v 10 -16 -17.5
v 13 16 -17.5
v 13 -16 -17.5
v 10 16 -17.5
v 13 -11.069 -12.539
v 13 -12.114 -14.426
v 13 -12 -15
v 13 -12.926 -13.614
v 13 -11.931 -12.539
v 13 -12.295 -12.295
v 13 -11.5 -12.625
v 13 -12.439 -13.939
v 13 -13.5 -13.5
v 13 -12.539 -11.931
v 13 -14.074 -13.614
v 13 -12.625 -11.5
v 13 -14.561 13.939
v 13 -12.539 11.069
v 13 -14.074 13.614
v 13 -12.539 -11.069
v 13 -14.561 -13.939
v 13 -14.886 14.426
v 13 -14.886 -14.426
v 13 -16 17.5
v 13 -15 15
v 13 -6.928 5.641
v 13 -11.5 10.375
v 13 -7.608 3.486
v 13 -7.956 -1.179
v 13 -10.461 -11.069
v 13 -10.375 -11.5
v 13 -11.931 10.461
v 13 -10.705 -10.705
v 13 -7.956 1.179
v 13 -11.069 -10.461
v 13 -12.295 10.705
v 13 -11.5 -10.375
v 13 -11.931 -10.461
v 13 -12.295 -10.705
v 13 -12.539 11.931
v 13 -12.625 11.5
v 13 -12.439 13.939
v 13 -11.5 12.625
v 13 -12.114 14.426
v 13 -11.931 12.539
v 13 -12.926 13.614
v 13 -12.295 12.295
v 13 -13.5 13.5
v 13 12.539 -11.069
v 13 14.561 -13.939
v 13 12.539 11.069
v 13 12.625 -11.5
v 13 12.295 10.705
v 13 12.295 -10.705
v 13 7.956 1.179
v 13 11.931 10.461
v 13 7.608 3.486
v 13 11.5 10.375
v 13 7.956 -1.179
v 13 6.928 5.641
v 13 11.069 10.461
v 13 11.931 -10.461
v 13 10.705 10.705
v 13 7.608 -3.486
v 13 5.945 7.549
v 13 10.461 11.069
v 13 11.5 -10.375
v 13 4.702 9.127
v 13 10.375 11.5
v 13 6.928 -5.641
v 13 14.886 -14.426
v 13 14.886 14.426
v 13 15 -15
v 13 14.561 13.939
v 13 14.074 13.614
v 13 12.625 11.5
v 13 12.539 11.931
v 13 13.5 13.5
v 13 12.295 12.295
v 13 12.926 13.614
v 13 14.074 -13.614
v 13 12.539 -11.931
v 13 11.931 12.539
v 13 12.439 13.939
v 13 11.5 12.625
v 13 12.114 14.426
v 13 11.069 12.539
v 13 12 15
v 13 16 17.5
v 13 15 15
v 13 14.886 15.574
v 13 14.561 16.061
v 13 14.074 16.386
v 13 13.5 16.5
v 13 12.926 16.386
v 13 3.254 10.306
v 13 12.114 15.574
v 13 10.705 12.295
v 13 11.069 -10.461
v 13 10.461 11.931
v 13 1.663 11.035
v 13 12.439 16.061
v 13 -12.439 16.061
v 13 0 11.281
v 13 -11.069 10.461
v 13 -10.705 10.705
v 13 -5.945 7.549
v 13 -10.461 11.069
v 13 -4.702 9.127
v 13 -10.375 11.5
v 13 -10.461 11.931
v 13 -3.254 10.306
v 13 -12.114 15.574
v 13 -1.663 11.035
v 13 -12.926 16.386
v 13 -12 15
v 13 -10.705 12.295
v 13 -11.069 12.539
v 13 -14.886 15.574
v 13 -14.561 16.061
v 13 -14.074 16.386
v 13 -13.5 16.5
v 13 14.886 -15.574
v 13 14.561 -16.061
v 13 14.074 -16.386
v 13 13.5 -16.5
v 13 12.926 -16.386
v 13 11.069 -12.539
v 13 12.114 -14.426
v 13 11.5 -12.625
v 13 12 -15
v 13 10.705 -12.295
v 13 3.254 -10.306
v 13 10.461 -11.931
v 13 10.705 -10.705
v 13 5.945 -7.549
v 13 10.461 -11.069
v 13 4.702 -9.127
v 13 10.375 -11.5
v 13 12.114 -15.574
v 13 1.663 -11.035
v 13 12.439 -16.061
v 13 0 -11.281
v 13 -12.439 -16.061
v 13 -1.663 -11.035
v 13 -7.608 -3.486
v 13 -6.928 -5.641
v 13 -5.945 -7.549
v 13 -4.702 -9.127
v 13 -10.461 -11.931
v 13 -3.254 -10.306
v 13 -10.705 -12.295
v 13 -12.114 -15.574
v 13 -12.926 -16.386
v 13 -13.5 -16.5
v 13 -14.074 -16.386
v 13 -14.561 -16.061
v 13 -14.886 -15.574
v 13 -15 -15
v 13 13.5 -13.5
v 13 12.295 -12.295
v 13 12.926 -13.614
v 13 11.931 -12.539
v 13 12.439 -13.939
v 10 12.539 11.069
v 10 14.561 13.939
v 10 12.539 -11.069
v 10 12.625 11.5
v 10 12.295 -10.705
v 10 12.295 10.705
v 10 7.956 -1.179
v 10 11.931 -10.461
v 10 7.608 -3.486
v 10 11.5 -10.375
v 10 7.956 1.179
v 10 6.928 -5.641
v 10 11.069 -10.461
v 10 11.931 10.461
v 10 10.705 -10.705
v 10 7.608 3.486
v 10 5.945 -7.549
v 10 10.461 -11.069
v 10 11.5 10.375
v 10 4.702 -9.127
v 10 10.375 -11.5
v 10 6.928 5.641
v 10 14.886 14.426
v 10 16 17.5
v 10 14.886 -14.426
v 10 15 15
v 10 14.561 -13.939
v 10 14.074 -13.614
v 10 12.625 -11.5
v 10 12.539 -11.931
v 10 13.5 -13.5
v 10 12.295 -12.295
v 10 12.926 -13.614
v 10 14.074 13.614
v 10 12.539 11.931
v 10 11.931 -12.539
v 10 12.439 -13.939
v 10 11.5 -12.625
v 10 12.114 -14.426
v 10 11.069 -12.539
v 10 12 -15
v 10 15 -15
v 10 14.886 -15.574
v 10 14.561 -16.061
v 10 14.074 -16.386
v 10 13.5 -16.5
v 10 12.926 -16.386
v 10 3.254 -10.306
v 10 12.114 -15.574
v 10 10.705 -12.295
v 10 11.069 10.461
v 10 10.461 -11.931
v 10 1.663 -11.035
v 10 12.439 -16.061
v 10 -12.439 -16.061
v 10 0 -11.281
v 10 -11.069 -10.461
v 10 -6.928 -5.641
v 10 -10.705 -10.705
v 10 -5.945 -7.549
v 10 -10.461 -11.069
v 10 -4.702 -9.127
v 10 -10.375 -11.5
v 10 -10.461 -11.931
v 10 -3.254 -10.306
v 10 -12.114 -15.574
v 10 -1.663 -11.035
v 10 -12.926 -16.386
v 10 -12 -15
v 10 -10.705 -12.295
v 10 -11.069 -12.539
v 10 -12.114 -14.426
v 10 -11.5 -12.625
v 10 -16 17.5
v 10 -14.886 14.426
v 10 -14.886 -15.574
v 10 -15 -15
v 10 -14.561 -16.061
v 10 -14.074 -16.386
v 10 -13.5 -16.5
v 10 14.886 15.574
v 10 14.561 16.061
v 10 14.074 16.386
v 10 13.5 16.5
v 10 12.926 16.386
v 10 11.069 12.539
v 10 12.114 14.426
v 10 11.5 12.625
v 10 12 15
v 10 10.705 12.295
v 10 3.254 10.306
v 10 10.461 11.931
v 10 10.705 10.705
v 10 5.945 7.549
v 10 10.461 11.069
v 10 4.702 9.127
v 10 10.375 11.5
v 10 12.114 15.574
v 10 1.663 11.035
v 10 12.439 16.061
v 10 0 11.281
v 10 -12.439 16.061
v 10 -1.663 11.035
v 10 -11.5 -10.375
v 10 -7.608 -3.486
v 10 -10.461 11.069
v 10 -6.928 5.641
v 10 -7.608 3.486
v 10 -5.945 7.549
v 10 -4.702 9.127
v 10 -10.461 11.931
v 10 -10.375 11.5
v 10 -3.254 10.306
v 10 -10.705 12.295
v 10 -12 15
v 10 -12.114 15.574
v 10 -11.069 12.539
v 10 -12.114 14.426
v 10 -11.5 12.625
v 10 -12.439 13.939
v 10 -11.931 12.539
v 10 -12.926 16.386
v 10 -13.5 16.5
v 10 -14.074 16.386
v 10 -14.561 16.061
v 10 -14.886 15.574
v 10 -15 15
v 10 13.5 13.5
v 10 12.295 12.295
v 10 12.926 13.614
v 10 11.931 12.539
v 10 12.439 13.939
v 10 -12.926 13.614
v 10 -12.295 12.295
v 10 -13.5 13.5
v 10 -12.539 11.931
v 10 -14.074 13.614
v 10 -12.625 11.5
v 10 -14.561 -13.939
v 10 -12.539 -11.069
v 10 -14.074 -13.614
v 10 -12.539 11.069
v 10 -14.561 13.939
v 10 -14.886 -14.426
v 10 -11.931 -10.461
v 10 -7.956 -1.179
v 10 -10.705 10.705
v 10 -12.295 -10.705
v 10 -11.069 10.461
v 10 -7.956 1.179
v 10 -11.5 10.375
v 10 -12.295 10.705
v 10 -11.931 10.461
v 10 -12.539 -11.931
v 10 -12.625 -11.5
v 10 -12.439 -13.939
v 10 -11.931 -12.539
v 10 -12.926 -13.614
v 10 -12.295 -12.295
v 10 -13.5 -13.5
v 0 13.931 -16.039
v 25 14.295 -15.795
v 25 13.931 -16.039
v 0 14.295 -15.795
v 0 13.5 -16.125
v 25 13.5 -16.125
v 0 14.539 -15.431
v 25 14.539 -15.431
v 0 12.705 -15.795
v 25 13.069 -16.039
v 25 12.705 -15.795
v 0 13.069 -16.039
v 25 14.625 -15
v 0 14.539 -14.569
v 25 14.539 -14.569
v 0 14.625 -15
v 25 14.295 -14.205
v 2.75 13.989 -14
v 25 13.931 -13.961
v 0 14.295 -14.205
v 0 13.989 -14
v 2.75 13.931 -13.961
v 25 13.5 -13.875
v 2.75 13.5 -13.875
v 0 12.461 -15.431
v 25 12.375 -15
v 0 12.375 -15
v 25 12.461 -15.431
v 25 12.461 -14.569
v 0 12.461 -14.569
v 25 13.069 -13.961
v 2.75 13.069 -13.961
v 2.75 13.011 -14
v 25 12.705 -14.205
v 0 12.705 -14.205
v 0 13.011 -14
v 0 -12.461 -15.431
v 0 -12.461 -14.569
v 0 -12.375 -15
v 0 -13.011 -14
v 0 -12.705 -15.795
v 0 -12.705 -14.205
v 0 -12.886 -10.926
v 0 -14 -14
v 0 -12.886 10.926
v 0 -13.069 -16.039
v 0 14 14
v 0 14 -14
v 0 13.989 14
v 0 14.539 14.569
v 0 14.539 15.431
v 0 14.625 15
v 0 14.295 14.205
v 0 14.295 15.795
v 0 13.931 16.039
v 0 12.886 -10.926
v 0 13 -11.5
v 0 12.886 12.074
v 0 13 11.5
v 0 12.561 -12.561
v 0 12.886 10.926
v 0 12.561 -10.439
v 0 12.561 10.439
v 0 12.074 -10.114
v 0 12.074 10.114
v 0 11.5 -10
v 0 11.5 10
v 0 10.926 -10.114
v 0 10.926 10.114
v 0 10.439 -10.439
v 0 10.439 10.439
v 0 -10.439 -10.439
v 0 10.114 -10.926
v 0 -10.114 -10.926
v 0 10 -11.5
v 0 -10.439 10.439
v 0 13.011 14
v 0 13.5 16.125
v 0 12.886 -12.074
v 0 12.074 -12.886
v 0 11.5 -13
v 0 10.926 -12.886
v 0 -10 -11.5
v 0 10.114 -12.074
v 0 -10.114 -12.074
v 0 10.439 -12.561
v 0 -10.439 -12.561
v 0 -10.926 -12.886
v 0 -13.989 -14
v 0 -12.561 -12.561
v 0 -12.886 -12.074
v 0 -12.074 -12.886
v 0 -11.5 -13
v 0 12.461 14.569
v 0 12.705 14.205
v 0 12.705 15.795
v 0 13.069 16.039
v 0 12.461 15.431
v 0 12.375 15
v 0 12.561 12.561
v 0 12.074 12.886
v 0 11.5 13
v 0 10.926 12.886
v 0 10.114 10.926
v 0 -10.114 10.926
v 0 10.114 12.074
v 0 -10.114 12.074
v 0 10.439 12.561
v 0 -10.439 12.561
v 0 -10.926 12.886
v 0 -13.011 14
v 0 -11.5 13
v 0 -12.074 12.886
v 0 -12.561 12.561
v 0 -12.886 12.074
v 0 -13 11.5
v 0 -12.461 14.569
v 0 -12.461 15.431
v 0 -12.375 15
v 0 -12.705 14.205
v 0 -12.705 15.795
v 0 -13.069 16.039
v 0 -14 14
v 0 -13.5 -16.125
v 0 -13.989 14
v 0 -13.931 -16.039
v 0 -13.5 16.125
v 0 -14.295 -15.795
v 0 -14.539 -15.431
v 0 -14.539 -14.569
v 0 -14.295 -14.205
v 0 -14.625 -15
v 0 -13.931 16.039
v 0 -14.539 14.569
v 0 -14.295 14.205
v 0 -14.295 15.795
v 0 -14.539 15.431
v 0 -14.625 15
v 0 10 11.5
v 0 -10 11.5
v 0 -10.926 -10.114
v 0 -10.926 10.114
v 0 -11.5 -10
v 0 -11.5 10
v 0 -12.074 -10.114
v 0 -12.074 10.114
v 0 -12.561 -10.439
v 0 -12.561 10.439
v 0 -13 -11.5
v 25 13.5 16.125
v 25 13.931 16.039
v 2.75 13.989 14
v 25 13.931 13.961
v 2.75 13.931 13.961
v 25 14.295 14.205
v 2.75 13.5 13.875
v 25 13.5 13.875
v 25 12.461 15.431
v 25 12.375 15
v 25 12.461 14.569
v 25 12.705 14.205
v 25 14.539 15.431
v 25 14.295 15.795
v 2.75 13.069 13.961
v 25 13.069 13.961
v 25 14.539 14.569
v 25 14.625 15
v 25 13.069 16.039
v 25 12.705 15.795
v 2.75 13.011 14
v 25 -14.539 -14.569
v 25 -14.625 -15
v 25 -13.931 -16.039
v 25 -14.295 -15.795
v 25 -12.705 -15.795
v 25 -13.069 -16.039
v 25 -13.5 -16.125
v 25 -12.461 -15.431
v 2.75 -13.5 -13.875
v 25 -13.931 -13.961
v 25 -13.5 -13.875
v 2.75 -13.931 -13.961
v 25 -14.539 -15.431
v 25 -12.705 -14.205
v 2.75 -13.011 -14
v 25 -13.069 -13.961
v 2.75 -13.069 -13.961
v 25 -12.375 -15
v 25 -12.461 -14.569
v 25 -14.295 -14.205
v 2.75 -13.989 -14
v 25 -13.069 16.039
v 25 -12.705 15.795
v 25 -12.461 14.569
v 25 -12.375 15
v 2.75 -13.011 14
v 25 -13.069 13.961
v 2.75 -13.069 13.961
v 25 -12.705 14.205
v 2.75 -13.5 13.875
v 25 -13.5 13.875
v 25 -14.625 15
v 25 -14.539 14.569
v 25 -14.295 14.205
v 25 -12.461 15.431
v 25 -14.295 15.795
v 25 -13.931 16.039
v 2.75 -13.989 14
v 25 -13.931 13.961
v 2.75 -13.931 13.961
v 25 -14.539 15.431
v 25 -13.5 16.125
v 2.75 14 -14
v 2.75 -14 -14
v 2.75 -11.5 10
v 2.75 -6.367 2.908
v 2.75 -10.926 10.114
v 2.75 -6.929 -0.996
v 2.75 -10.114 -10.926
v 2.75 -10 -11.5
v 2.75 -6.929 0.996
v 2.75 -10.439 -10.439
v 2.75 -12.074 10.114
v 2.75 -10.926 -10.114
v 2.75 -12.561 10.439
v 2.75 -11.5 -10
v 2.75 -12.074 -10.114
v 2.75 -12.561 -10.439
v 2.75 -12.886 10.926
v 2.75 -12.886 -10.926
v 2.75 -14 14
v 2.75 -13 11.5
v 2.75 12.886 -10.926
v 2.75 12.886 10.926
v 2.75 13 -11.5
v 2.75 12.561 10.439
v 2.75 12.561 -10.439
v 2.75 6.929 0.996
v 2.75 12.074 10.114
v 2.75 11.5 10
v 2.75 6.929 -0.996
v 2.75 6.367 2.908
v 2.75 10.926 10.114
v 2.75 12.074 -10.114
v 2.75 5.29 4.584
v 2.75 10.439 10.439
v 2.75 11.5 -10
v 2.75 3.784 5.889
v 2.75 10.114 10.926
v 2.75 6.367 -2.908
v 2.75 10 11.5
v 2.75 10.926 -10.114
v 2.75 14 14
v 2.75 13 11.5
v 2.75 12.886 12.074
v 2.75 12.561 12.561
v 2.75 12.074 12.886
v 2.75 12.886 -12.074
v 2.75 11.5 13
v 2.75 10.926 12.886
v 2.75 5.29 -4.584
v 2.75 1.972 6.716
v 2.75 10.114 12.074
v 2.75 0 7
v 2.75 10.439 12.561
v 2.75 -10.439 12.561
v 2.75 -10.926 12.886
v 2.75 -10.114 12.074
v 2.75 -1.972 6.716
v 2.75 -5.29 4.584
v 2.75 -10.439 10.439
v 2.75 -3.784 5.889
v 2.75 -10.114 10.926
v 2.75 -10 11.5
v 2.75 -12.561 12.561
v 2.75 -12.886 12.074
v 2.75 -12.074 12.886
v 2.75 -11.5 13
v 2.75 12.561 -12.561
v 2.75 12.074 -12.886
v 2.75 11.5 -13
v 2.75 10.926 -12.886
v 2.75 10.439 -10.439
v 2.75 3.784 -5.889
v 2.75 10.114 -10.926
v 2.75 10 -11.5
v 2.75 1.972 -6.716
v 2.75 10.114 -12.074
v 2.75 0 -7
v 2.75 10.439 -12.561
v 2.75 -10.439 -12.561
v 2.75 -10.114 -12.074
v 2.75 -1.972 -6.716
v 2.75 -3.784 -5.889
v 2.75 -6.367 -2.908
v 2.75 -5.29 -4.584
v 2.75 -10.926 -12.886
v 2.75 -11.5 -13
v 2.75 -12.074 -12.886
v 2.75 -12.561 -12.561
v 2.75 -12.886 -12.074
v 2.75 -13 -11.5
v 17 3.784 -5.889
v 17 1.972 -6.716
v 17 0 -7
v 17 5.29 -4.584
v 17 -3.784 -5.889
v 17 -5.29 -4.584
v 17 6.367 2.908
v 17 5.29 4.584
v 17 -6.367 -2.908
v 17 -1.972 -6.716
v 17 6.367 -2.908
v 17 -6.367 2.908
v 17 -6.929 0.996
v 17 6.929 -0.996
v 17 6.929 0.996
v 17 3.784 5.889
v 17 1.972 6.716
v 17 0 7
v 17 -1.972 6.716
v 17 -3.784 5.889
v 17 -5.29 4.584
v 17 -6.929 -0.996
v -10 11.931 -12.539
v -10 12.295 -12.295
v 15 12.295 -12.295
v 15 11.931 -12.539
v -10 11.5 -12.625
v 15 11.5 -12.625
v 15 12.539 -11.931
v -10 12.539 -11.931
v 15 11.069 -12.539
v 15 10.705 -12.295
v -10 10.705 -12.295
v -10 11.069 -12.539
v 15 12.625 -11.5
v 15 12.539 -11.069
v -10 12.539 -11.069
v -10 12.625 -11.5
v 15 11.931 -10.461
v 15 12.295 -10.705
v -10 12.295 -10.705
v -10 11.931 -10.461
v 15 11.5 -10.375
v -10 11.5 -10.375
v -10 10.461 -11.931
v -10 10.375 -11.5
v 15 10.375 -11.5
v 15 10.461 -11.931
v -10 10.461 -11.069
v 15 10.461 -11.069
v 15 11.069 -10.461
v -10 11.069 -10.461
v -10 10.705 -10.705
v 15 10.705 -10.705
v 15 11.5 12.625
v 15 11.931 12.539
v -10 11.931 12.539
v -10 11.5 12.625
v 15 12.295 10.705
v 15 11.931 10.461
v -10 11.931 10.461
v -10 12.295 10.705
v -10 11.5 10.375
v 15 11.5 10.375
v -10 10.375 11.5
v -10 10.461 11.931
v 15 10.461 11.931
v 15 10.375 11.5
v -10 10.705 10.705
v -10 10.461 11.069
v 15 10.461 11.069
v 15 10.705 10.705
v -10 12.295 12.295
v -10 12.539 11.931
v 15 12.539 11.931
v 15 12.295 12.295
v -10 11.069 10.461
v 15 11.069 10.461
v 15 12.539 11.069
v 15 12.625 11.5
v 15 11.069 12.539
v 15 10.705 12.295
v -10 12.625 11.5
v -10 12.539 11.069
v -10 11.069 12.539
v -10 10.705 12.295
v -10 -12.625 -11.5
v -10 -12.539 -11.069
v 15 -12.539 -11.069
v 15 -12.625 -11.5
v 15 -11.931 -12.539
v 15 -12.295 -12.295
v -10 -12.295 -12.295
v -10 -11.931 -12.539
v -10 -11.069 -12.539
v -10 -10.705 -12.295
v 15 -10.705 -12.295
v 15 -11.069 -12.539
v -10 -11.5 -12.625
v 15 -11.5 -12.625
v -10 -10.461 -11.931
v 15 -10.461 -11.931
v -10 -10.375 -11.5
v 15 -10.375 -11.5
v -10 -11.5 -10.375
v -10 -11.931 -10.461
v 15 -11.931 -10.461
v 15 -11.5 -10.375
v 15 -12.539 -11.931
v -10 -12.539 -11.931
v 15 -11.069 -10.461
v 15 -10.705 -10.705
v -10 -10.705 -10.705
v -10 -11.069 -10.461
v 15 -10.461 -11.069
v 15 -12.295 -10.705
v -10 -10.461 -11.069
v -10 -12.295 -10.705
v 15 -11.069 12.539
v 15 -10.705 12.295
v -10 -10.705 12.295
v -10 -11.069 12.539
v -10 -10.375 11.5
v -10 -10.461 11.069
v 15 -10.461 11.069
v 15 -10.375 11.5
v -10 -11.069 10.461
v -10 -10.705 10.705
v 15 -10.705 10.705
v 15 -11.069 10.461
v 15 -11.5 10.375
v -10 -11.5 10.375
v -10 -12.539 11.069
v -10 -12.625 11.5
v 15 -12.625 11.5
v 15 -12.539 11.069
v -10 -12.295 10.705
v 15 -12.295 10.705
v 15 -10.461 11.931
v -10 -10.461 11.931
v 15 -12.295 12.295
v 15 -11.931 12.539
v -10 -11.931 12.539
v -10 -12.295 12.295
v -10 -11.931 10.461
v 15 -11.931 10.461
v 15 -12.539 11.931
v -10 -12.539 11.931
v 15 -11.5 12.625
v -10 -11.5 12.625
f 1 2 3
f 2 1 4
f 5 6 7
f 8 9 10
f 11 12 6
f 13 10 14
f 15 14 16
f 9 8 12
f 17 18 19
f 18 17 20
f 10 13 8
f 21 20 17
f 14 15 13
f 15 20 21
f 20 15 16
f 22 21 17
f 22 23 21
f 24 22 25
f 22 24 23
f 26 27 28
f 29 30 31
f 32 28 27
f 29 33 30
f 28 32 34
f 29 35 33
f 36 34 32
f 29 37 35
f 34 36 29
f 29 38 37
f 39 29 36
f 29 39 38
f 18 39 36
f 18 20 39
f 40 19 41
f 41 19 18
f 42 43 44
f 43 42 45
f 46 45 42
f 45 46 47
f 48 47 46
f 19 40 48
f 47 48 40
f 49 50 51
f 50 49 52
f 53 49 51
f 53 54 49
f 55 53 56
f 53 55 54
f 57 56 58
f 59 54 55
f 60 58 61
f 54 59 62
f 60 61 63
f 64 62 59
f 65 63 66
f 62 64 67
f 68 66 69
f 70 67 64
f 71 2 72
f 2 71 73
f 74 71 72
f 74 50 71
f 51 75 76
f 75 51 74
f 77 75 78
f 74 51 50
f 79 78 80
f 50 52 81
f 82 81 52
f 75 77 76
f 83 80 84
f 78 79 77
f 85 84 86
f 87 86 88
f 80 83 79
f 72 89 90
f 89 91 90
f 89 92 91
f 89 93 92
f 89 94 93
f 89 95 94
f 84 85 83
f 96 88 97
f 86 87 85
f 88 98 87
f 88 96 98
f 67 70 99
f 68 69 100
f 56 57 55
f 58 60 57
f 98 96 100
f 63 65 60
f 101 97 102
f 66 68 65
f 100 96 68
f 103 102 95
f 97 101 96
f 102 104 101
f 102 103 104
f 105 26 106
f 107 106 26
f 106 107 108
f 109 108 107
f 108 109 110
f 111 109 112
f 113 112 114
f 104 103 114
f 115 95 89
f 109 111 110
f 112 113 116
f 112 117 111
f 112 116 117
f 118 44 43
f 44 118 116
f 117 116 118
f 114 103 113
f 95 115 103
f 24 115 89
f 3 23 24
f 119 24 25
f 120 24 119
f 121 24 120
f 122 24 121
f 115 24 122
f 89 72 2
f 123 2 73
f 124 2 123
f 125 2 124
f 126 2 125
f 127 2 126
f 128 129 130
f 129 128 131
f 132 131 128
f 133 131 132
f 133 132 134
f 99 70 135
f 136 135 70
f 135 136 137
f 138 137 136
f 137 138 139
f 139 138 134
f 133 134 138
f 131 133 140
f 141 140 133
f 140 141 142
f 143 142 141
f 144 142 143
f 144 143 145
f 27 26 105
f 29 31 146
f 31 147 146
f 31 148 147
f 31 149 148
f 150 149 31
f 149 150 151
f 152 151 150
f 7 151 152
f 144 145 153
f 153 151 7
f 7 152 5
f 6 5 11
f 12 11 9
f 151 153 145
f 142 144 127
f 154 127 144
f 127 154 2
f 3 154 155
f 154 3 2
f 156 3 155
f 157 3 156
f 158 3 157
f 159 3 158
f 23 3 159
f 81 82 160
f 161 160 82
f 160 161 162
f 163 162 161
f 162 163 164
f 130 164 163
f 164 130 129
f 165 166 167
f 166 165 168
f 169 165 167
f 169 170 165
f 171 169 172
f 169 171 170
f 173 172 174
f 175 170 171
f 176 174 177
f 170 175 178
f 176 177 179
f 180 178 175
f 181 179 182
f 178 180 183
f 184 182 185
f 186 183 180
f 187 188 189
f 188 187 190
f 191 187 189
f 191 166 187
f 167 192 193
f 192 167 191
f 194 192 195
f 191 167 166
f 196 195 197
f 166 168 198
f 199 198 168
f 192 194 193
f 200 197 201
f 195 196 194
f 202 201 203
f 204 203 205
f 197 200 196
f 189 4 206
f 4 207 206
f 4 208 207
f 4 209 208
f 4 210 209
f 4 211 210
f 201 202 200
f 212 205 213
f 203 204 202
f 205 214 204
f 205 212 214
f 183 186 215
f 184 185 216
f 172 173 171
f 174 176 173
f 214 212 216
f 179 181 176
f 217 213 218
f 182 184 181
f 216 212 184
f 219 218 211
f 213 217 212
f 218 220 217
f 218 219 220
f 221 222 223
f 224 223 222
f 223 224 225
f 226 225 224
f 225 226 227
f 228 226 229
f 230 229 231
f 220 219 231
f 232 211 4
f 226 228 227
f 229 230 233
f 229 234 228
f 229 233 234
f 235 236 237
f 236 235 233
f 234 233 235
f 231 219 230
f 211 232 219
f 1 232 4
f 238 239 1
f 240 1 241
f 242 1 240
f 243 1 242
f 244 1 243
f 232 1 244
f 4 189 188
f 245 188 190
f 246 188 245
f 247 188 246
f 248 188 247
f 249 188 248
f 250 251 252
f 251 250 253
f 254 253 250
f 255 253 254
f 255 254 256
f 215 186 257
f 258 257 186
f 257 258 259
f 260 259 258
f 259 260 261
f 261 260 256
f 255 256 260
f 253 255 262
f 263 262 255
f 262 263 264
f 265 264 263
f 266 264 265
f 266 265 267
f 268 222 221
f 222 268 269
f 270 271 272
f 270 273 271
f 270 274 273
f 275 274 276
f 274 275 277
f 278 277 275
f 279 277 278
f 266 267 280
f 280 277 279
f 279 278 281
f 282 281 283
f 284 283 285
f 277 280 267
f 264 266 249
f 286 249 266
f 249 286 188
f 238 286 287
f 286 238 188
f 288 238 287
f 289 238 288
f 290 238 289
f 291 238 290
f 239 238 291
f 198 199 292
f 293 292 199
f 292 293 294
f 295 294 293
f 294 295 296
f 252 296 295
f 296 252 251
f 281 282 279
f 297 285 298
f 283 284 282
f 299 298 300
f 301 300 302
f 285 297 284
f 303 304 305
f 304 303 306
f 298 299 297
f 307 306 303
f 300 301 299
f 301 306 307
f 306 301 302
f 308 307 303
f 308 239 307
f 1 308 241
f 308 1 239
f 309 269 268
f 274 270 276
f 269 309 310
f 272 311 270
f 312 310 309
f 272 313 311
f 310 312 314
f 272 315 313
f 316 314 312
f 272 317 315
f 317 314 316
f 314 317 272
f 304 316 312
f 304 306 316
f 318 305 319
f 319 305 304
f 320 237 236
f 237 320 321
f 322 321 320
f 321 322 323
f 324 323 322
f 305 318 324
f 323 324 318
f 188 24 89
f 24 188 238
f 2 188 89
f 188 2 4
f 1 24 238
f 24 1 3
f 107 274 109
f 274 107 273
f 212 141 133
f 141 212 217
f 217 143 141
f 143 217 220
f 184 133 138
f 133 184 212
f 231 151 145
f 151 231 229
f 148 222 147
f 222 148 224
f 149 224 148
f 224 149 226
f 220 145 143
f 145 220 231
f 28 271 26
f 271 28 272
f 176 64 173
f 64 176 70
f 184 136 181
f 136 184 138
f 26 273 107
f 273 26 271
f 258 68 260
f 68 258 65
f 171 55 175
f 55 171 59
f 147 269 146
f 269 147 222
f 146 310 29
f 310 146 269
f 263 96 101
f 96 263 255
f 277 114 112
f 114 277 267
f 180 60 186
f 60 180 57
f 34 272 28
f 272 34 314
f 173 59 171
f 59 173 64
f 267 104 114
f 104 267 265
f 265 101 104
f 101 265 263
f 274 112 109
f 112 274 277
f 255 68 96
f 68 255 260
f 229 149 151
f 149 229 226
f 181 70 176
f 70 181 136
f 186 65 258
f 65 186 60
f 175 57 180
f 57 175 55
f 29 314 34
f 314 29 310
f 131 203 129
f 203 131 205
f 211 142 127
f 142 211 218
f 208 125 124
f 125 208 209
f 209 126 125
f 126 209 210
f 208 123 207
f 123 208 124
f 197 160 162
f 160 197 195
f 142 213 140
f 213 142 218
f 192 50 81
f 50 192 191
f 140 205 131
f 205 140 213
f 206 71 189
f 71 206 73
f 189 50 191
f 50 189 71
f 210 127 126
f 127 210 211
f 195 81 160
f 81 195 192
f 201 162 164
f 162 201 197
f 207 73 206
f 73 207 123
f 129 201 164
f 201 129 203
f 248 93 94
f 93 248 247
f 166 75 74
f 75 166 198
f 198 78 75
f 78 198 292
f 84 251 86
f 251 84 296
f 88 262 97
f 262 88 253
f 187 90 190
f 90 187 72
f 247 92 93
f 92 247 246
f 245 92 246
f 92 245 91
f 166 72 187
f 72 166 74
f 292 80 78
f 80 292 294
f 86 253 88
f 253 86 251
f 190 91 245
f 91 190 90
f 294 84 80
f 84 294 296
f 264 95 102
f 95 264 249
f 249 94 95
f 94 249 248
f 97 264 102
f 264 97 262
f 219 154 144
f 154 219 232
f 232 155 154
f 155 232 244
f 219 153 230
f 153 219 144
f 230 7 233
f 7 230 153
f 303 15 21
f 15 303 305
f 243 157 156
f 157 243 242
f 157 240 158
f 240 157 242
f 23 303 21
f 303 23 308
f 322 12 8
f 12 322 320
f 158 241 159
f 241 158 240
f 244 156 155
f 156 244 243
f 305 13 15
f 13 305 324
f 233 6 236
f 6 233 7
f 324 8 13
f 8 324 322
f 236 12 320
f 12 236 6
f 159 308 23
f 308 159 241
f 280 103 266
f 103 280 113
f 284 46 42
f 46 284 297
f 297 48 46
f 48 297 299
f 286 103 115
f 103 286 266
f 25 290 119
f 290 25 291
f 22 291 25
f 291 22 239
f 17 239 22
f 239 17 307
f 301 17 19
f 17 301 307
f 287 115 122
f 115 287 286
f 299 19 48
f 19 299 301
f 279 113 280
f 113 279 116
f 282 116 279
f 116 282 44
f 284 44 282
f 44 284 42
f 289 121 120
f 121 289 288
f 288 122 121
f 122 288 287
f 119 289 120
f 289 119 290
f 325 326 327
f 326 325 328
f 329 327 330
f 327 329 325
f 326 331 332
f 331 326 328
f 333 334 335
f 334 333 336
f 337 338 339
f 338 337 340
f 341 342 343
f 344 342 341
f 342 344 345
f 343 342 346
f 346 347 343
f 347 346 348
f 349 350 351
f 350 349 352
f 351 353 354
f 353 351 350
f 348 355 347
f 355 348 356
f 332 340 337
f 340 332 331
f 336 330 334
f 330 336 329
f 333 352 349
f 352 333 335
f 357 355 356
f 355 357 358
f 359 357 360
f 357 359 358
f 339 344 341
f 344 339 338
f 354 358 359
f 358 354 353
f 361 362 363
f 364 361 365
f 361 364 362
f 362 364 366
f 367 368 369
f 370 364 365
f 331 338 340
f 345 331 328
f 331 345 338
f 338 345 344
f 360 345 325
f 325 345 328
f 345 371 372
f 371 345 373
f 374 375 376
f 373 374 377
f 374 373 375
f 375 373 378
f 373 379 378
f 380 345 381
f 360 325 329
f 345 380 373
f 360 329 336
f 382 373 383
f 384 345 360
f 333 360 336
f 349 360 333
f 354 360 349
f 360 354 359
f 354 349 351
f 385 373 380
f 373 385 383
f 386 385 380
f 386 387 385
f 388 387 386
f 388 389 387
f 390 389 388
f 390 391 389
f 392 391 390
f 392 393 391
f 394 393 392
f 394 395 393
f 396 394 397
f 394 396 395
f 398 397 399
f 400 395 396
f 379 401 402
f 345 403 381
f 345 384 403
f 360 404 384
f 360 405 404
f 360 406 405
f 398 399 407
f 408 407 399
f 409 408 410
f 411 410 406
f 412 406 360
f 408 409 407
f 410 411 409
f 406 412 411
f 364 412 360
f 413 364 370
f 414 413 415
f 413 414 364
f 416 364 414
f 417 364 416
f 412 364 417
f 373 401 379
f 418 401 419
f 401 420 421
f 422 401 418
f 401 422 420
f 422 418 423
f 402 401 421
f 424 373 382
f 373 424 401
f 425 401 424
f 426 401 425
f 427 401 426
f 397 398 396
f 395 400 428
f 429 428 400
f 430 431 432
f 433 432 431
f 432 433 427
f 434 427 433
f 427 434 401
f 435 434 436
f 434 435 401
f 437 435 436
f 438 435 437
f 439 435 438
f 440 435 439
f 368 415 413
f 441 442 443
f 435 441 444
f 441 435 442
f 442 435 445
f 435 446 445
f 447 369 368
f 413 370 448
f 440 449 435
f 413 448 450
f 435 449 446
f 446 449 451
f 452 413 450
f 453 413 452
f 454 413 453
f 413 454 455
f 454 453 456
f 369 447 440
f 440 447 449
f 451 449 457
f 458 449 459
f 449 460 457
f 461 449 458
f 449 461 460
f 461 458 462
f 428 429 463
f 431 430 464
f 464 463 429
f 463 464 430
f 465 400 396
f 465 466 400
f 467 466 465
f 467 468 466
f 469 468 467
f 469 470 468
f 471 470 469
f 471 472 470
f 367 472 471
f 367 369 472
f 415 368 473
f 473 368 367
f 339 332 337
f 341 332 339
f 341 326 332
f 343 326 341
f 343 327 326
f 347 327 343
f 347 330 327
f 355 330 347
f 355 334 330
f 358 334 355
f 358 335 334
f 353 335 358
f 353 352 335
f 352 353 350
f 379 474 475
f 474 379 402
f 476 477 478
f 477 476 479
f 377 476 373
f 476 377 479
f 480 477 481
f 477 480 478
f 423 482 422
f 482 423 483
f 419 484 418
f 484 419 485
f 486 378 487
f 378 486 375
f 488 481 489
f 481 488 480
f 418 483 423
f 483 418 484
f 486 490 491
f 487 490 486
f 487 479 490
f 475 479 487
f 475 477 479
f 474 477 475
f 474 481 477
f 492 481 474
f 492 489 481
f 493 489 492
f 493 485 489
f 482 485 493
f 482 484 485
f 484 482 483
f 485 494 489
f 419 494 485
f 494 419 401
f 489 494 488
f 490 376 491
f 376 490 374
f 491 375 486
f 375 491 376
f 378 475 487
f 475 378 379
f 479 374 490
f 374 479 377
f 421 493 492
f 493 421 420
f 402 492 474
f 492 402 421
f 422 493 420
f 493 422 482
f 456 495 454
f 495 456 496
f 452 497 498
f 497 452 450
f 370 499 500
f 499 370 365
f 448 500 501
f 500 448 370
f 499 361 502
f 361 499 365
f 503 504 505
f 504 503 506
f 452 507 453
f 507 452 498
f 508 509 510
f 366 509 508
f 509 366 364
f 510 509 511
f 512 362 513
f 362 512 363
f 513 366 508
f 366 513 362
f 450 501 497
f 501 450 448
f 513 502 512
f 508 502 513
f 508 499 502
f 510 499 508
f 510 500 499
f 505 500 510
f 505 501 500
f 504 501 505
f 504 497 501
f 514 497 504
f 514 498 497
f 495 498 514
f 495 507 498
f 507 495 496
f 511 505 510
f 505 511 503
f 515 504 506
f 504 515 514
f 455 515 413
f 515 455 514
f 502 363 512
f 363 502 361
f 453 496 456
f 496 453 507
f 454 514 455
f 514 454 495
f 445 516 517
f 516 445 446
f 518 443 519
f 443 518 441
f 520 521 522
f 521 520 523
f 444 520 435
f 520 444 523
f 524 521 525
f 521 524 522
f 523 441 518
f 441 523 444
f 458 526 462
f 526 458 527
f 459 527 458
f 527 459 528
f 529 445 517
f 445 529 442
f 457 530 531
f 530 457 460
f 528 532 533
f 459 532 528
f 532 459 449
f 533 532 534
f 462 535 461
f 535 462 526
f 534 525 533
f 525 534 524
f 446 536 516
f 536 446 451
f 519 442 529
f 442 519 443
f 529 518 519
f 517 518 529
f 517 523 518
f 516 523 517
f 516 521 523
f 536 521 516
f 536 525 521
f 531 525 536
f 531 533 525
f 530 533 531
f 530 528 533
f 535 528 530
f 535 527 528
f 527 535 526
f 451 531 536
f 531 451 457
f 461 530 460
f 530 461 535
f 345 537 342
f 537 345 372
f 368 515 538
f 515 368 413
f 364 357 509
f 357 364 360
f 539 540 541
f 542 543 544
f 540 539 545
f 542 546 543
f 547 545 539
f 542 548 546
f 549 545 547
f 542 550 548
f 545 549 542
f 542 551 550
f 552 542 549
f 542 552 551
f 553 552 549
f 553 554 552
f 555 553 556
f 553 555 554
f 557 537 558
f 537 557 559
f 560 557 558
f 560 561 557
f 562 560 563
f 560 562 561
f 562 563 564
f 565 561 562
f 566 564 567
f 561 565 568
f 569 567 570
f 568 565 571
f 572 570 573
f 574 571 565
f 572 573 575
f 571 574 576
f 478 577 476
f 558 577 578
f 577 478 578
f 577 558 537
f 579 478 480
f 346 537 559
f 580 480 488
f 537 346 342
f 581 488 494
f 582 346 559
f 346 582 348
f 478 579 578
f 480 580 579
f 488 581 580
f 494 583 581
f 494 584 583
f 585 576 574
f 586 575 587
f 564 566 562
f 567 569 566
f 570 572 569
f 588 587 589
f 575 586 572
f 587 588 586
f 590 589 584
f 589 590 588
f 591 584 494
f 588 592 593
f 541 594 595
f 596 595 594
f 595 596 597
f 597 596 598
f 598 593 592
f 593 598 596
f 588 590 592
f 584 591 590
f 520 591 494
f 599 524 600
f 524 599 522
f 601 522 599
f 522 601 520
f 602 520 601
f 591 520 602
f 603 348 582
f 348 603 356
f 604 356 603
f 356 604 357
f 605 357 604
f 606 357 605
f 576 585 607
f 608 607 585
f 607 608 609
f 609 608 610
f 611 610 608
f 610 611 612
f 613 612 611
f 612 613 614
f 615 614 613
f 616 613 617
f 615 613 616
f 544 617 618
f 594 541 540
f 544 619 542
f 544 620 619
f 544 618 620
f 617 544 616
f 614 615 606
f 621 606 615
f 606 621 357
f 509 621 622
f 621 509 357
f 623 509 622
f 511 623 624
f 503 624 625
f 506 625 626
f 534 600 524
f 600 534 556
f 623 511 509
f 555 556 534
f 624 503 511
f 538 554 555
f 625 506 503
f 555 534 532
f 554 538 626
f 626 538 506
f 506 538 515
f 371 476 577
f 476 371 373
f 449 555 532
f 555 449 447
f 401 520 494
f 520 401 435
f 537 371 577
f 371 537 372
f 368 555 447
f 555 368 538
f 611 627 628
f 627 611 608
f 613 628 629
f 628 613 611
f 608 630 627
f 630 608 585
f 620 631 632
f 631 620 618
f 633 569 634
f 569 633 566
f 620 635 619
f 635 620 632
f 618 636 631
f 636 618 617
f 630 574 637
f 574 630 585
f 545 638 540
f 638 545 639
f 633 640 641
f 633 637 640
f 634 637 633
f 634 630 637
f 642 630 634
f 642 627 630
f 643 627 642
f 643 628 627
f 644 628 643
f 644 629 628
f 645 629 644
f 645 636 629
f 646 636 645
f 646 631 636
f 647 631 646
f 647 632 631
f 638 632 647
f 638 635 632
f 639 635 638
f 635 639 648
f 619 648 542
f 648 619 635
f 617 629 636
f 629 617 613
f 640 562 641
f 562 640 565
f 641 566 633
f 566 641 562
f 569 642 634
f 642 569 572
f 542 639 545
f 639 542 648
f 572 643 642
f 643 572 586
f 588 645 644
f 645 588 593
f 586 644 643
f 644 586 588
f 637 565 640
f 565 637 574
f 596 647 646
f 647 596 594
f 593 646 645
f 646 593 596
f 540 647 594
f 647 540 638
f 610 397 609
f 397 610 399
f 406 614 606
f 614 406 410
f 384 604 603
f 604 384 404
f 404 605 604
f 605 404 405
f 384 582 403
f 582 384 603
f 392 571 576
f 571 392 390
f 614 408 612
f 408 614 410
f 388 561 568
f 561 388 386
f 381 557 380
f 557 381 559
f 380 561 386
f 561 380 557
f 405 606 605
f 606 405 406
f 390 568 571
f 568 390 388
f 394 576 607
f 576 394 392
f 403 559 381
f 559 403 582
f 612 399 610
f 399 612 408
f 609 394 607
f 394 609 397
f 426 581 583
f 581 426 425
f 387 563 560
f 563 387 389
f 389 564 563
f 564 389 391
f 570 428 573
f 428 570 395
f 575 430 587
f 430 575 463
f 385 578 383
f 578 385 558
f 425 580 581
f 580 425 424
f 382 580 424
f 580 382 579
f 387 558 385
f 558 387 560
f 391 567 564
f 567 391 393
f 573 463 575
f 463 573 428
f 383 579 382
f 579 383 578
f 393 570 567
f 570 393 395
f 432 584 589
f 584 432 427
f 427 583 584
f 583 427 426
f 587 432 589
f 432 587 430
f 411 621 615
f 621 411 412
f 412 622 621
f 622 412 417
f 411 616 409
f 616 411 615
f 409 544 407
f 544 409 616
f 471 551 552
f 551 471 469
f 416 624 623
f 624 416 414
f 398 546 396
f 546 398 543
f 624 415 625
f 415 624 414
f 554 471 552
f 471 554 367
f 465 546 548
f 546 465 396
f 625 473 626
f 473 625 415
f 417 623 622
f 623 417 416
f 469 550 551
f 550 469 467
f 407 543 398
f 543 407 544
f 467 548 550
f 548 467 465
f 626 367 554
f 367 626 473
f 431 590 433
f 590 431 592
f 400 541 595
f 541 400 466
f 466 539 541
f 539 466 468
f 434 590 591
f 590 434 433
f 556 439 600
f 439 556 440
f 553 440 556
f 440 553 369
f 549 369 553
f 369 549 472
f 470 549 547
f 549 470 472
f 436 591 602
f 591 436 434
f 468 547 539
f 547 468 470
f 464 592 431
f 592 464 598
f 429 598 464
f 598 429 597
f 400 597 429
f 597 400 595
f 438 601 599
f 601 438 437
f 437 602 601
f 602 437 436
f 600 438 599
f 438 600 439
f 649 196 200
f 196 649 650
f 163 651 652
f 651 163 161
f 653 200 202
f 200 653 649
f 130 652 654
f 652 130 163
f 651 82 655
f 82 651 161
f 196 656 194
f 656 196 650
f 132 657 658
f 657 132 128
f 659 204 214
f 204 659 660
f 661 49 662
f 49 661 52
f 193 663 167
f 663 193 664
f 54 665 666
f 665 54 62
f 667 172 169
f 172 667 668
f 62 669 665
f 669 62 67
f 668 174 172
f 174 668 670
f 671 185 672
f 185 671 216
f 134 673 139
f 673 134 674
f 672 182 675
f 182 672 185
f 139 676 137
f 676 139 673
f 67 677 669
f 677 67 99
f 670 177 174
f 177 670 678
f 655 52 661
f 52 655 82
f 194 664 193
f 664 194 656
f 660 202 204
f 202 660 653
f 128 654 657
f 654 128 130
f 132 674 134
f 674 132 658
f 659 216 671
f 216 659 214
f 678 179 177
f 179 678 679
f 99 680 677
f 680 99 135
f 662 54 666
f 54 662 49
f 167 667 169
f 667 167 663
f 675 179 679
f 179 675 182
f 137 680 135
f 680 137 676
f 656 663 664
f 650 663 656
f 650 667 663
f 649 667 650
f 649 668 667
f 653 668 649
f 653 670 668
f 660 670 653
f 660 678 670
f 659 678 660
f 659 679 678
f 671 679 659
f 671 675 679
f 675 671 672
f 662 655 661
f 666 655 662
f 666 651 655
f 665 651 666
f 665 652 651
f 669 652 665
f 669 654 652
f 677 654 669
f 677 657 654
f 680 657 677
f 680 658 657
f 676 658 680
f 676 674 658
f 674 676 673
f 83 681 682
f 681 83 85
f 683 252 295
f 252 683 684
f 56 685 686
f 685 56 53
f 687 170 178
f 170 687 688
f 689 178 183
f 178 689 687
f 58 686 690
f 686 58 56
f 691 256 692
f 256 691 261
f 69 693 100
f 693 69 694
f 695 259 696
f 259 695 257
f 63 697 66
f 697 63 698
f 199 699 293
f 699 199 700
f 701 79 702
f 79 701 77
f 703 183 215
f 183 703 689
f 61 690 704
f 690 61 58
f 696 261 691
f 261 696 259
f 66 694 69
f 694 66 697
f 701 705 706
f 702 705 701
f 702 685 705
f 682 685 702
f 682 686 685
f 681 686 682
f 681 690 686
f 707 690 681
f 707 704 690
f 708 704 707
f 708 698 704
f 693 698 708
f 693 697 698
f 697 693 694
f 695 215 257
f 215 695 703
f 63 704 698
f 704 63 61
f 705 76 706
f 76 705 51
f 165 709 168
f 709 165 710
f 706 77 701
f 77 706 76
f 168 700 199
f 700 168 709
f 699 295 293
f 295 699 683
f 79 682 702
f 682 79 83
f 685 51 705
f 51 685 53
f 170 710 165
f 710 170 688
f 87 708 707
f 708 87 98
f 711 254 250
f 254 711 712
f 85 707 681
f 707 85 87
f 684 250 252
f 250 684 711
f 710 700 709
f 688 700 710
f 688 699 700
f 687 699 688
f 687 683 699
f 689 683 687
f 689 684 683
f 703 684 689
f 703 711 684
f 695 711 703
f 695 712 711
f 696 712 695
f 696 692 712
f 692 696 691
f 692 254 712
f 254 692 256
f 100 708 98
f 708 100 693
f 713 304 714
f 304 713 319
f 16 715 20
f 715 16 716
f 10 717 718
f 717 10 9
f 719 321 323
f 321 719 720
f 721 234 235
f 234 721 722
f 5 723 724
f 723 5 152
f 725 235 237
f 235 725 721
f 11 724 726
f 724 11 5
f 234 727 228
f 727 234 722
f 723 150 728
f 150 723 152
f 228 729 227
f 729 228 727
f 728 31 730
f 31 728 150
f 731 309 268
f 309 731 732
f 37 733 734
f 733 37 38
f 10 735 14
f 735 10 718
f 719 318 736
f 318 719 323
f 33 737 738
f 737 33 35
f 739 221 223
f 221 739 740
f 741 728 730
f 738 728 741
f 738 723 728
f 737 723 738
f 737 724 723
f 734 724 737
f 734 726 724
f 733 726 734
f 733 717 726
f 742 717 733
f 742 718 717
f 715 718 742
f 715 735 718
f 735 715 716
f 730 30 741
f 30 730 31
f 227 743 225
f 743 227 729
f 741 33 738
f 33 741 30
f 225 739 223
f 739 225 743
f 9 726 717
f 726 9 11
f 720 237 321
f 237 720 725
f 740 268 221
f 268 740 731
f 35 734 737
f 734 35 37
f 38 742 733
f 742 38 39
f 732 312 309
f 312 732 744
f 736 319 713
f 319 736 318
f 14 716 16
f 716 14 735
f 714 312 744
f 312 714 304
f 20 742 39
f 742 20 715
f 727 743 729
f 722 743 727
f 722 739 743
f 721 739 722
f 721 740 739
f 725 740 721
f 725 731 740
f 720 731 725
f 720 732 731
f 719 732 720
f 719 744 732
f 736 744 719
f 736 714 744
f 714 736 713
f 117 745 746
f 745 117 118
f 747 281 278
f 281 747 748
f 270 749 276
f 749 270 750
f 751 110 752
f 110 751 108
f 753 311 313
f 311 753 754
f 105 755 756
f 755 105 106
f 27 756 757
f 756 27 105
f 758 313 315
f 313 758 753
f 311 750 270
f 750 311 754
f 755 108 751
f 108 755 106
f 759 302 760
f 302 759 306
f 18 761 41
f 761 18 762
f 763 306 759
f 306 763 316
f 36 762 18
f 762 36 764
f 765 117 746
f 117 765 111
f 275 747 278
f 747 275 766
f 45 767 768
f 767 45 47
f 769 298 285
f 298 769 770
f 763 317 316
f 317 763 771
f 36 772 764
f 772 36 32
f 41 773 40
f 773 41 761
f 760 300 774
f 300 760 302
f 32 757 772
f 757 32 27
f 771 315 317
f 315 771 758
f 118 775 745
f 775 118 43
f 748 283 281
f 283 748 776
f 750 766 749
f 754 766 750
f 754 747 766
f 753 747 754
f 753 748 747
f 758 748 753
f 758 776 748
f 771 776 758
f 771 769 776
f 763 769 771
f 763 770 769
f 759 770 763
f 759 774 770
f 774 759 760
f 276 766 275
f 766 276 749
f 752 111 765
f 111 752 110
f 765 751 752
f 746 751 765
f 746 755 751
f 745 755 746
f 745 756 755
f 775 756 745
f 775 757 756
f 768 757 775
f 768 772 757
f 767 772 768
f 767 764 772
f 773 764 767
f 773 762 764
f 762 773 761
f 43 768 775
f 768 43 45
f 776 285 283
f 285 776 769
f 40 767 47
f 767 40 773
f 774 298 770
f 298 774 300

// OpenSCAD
mountBoard_thickness = 3;
mountBoard_spacing = 22;
mountBoardHole_vertical = 19;
mountBoardHole_horizontal = 16;

cameraBoard_thickness = 2.75;
cameraBoard_spacing = 28;
cameraLens_width = 14;
cameraLens_height = 17;


/*
 * add holes at four corners, offset symmetrically
 */
module add_screwHoles(screw_diameter = 3, offset = 2.5, width, height, screw_color = "") {
	difference() {
		children(0);
		translate([width/2 - offset, height/2 - offset, -10])
			cylinder(r = screw_diameter/2, h = 100, $fn=16);
		translate([-(width/2 - offset), height/2 - offset, -10])
			cylinder(r = screw_diameter/2, h = 100, $fn=16);
		translate([width/2 - offset, -(height/2 - offset), -10])
			cylinder(r = screw_diameter/2, h = 100, $fn=16);
		translate([-(width/2 - offset), -(height/2 - offset), -10])
			cylinder(r = screw_diameter/2, h = 100, $fn=16);
	}

	if (len(screw_color) != 0) {
		color(screw_color) {
		translate([width/2 - offset, height/2 - offset, -10])
			cylinder(r = 0.75*screw_diameter/2, h = 25, $fn=16);
		translate([-(width/2 - offset), height/2 - offset, -10])
			cylinder(r = 0.75*screw_diameter/2, h = 25, $fn=16);
		translate([width/2 - offset, -(height/2 - offset), -10])
			cylinder(r = 0.75*screw_diameter/2, h = 25, $fn=16);
		translate([-(width/2 - offset), -(height/2 - offset), -10])
			cylinder(r = 0.75*screw_diameter/2, h = 25, $fn=16);
	}
}
}


module mountBoard(width = 35, height = 32) {
	add_screwHoles(3, 2.5, width, height, "blue")
		__mountBoard(width, height);
}

module __mountBoard(width = 35, height = 32) {
    yscale = mountBoardHole_horizontal / mountBoardHole_vertical;
    xscale = 1.0 / yscale;

	color("grey") {
        difference() {
            translate([-width/2, -height/2, 0])
                cube([width, height, mountBoard_thickness]);
                translate([0, 0, -mountBoard_thickness*2])
					scale([xscale, yscale, 1])
						cylinder(r = mountBoardHole_vertical/2, h = mountBoard_thickness*4);
            }    
		}
}

module cameraBoard(width = 28, height = 28) {
	add_screwHoles(3, 2.5, width, height, "orange")
		__cameraBoard(width, height);
}

module __cameraBoard(width = 28, height = 28) {
    color("cyan") {
		translate([-width/2, -height/2, 0])
			cube([width, height, cameraBoard_thickness]);
		cylinder(r = cameraLens_width/2, h = cameraLens_height);
	}
}




//
// main begins
//

rotate([0, 90, 0]) {
    translate([0, 0, 10])
		mountBoard();
    cameraBoard();
}
